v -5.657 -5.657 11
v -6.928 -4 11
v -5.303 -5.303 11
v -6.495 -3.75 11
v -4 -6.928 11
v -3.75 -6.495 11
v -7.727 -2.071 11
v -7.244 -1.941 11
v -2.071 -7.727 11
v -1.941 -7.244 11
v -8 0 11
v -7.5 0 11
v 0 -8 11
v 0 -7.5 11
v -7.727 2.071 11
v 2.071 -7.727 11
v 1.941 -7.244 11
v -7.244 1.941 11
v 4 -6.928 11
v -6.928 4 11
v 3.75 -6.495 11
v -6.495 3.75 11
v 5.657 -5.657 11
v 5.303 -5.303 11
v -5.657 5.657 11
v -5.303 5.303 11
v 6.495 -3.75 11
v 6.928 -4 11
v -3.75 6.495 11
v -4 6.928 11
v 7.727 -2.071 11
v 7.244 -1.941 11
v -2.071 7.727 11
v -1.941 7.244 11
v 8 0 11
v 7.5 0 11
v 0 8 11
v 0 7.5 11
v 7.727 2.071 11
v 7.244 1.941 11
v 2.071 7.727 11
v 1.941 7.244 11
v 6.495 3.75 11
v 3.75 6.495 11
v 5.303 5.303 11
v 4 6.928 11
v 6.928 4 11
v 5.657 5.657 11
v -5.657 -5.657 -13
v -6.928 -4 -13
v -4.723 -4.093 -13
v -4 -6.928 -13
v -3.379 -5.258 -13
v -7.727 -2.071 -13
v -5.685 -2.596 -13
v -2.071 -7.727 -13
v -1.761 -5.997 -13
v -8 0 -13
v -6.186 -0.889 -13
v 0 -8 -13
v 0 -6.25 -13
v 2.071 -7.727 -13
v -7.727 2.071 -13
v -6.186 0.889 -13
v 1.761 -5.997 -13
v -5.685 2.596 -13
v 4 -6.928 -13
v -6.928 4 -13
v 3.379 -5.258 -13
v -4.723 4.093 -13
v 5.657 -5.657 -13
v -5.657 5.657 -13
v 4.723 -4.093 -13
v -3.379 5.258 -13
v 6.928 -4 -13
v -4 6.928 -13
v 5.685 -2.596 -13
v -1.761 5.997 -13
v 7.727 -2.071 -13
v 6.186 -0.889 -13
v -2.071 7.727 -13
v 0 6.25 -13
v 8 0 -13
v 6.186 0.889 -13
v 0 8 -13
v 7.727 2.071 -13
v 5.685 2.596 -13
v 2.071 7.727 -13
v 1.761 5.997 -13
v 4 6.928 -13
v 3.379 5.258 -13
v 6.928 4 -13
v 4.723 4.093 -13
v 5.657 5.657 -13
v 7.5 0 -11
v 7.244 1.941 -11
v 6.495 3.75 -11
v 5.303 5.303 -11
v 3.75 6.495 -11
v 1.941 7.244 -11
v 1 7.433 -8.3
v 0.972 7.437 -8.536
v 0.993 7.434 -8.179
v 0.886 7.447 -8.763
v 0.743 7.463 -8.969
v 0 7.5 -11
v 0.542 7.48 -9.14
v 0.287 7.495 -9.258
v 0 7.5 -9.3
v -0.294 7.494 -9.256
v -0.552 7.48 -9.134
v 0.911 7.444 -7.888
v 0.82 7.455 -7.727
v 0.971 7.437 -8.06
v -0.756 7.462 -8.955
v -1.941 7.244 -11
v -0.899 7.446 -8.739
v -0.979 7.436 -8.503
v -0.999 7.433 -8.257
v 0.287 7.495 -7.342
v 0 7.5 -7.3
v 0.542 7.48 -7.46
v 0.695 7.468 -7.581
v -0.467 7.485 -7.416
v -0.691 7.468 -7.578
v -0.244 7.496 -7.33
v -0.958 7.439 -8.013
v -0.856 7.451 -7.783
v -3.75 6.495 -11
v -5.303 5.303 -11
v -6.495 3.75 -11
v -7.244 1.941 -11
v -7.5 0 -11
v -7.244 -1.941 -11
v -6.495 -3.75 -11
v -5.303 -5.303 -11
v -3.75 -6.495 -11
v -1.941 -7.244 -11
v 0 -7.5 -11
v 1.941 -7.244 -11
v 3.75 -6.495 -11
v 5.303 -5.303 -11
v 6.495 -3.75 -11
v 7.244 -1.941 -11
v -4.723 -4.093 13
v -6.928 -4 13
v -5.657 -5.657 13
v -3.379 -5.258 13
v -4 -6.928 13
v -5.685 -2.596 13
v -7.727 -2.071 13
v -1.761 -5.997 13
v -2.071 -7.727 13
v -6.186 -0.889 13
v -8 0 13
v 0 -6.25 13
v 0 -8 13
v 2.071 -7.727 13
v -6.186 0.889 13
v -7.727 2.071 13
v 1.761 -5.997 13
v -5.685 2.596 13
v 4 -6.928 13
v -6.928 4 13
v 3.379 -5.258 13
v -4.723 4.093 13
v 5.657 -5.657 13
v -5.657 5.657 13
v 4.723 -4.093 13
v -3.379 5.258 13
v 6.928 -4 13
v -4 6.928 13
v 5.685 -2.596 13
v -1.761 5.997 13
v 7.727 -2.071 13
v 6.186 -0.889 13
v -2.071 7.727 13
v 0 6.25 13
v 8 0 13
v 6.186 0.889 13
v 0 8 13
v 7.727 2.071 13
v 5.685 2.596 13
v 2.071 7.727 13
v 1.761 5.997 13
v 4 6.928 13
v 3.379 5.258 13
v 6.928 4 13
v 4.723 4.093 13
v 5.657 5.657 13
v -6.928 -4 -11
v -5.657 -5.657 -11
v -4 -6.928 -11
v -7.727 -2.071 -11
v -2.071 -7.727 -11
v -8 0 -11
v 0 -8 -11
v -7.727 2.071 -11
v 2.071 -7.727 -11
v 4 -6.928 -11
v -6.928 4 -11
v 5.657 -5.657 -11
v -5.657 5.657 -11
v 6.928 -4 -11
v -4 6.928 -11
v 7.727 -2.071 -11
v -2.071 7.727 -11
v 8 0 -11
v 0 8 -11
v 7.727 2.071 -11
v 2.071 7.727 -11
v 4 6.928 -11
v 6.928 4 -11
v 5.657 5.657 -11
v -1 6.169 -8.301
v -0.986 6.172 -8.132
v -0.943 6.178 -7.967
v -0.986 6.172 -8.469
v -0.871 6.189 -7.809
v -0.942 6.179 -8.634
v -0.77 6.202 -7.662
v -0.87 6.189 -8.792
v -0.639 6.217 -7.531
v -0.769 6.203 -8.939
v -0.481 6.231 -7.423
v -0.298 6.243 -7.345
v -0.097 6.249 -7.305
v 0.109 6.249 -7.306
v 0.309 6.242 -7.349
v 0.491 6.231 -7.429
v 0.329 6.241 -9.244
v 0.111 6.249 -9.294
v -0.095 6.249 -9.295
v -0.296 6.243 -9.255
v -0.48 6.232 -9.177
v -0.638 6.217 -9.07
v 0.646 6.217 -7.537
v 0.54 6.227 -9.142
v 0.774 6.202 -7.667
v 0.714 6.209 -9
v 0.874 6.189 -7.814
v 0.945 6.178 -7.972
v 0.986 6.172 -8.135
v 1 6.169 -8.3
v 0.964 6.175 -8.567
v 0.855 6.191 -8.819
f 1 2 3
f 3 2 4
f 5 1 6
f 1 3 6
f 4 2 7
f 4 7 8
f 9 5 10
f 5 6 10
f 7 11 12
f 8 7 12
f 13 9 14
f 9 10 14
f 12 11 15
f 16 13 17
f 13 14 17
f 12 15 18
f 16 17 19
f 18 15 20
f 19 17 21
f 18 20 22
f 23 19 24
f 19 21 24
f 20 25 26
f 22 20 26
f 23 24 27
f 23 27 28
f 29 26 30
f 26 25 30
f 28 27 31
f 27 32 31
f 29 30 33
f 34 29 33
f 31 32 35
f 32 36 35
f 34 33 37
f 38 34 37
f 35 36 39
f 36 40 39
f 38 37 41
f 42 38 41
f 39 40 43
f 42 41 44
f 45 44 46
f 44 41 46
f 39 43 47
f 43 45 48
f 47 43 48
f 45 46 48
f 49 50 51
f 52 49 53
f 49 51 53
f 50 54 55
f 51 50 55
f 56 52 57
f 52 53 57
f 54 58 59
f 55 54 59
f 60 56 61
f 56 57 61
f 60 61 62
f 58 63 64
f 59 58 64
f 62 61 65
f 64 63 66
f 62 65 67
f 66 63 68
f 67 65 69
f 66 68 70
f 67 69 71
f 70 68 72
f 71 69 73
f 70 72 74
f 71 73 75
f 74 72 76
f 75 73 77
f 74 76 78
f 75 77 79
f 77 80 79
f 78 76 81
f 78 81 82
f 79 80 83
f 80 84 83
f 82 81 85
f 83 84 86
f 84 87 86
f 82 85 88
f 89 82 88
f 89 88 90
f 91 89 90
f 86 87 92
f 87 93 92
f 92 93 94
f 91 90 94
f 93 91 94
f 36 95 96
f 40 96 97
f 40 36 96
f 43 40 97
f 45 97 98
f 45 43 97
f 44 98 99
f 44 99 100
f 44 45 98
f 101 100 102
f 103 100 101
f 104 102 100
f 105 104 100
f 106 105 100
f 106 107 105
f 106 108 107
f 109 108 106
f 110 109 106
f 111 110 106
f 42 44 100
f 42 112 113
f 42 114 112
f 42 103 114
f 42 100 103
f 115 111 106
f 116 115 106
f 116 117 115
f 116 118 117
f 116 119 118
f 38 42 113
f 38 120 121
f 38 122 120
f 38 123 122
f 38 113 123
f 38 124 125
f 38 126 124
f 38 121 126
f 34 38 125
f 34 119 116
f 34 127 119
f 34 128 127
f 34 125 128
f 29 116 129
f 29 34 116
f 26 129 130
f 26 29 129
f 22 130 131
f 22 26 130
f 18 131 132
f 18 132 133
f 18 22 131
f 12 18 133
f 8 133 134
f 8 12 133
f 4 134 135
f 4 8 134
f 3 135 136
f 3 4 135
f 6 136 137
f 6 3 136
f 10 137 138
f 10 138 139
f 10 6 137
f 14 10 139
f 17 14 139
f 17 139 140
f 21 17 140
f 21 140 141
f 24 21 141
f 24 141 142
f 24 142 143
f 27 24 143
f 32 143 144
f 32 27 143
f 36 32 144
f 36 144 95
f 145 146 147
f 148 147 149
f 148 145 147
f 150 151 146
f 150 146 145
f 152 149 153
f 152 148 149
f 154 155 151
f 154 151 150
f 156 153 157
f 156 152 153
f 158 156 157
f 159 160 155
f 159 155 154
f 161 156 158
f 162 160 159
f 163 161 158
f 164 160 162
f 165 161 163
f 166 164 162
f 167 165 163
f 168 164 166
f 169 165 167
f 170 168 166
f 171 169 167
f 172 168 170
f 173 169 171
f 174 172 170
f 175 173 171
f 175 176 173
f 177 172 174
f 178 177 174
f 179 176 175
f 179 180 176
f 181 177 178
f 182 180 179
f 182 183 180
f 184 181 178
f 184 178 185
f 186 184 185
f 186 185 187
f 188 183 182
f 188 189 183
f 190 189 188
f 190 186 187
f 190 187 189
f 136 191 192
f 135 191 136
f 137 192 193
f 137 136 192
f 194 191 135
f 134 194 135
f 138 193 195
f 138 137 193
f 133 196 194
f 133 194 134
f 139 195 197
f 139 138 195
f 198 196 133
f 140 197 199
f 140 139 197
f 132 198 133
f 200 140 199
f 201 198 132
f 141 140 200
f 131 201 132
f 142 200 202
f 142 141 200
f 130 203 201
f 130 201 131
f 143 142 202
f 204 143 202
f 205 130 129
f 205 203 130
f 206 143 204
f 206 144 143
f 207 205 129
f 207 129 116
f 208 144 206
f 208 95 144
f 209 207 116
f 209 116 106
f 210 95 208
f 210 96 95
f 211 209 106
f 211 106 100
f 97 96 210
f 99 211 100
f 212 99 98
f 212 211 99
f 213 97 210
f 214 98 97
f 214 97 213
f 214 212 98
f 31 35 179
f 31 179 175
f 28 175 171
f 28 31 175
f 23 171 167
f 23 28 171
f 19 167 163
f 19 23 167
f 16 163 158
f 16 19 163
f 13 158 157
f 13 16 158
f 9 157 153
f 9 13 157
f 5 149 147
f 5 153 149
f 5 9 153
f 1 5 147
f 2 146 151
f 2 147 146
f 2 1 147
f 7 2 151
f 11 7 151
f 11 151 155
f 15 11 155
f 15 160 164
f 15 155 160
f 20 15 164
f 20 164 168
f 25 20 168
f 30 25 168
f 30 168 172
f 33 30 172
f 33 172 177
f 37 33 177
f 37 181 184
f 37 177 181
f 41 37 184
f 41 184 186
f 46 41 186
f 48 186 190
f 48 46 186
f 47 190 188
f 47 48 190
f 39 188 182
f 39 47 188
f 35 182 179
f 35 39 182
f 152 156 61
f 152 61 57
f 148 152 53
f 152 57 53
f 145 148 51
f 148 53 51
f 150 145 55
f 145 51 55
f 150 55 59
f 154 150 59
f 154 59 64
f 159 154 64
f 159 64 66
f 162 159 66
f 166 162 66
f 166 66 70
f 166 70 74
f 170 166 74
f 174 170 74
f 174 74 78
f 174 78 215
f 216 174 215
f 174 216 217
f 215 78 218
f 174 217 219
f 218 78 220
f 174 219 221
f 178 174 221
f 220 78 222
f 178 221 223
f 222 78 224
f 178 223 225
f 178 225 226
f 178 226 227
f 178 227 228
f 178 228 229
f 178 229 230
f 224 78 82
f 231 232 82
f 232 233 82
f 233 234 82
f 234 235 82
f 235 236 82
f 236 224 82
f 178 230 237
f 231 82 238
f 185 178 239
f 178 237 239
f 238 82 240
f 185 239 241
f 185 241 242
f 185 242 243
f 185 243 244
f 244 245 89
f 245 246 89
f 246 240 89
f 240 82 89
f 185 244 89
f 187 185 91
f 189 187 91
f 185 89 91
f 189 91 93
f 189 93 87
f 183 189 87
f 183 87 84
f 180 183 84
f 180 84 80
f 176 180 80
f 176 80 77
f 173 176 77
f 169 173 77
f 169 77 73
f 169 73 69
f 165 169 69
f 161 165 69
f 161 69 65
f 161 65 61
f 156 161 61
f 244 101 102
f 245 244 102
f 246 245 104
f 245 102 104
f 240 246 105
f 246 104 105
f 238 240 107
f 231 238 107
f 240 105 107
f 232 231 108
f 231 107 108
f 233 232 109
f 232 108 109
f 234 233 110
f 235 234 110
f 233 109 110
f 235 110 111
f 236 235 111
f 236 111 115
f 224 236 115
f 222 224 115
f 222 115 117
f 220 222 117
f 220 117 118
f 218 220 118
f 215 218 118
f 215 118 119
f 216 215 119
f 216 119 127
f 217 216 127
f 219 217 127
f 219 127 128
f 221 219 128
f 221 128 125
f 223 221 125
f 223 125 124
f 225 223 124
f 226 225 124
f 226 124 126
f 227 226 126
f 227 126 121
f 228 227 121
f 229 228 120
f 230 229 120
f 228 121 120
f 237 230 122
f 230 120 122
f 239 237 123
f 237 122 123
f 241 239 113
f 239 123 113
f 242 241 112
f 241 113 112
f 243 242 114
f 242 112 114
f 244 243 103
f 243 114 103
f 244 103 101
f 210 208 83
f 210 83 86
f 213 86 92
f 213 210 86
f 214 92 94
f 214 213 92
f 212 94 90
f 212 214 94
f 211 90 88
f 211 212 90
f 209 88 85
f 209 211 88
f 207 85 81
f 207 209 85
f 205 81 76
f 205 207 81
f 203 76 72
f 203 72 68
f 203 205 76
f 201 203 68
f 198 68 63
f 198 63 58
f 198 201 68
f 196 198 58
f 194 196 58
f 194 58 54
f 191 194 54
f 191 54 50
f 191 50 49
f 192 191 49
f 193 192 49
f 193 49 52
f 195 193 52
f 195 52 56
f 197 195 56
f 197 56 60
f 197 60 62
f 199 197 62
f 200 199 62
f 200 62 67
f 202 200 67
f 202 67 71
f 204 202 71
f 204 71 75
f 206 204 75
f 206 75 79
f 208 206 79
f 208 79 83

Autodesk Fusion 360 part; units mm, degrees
sketch "Skizze3" plane through (0, 0, 0) normal (0, 1, 0) x (1, 0, 0)
  line L0 (0, 0) -> (0, 13)
  line L1 (0, 13) -> (8, 13)
  line L2 (8, 13) -> (8, 11)
  line L3 (8, 11) -> (7.5, 11)
  line L4 (7.5, 11) -> (7.5, 0)
  line L5 (1.75, 0) -> (22.5, 0)
  line L6 (0, 0) -> (0, -13)
  line L7 (0, -13) -> (8, -13)
  line L8 (8, -11) -> (7.5, -11)
  line L9 (7.5, -11) -> (7.5, 0)
  line L10 (8, -13) -> (8, -11)
  dimension "d14" = 13
  dimension "d15" = 8
  dimension "d16" = 2
  dimension "d17" = 0.5
revolve "Drehen1" add sketch "Skizze3" angle 360 about axis through (0, 0, 0) along (0, 0, 1)
hole "Bohrung1" at (0, 0, 13) direction (0, 0, -1) diameter 12.5 end through all
ref_plane "Arbeitsebene1" through (0, 7.5, 0) normal (0, 1, 0) x (0, 0, 1)
sketch "Skizze5" plane through (0, 7.5, 0) normal (0, 1, 0) x (1, 0, 0)
  circle A0 centre (0, 8.3) radius 1
  dimension "d24" = 2
extrude "Extrusion3" cut sketch "Skizze5" against normal blind 3
component "Component" placed x (1, 0, 0) y (0, 1, 0) z (0, 0, 1) at (0, 0, 0)
